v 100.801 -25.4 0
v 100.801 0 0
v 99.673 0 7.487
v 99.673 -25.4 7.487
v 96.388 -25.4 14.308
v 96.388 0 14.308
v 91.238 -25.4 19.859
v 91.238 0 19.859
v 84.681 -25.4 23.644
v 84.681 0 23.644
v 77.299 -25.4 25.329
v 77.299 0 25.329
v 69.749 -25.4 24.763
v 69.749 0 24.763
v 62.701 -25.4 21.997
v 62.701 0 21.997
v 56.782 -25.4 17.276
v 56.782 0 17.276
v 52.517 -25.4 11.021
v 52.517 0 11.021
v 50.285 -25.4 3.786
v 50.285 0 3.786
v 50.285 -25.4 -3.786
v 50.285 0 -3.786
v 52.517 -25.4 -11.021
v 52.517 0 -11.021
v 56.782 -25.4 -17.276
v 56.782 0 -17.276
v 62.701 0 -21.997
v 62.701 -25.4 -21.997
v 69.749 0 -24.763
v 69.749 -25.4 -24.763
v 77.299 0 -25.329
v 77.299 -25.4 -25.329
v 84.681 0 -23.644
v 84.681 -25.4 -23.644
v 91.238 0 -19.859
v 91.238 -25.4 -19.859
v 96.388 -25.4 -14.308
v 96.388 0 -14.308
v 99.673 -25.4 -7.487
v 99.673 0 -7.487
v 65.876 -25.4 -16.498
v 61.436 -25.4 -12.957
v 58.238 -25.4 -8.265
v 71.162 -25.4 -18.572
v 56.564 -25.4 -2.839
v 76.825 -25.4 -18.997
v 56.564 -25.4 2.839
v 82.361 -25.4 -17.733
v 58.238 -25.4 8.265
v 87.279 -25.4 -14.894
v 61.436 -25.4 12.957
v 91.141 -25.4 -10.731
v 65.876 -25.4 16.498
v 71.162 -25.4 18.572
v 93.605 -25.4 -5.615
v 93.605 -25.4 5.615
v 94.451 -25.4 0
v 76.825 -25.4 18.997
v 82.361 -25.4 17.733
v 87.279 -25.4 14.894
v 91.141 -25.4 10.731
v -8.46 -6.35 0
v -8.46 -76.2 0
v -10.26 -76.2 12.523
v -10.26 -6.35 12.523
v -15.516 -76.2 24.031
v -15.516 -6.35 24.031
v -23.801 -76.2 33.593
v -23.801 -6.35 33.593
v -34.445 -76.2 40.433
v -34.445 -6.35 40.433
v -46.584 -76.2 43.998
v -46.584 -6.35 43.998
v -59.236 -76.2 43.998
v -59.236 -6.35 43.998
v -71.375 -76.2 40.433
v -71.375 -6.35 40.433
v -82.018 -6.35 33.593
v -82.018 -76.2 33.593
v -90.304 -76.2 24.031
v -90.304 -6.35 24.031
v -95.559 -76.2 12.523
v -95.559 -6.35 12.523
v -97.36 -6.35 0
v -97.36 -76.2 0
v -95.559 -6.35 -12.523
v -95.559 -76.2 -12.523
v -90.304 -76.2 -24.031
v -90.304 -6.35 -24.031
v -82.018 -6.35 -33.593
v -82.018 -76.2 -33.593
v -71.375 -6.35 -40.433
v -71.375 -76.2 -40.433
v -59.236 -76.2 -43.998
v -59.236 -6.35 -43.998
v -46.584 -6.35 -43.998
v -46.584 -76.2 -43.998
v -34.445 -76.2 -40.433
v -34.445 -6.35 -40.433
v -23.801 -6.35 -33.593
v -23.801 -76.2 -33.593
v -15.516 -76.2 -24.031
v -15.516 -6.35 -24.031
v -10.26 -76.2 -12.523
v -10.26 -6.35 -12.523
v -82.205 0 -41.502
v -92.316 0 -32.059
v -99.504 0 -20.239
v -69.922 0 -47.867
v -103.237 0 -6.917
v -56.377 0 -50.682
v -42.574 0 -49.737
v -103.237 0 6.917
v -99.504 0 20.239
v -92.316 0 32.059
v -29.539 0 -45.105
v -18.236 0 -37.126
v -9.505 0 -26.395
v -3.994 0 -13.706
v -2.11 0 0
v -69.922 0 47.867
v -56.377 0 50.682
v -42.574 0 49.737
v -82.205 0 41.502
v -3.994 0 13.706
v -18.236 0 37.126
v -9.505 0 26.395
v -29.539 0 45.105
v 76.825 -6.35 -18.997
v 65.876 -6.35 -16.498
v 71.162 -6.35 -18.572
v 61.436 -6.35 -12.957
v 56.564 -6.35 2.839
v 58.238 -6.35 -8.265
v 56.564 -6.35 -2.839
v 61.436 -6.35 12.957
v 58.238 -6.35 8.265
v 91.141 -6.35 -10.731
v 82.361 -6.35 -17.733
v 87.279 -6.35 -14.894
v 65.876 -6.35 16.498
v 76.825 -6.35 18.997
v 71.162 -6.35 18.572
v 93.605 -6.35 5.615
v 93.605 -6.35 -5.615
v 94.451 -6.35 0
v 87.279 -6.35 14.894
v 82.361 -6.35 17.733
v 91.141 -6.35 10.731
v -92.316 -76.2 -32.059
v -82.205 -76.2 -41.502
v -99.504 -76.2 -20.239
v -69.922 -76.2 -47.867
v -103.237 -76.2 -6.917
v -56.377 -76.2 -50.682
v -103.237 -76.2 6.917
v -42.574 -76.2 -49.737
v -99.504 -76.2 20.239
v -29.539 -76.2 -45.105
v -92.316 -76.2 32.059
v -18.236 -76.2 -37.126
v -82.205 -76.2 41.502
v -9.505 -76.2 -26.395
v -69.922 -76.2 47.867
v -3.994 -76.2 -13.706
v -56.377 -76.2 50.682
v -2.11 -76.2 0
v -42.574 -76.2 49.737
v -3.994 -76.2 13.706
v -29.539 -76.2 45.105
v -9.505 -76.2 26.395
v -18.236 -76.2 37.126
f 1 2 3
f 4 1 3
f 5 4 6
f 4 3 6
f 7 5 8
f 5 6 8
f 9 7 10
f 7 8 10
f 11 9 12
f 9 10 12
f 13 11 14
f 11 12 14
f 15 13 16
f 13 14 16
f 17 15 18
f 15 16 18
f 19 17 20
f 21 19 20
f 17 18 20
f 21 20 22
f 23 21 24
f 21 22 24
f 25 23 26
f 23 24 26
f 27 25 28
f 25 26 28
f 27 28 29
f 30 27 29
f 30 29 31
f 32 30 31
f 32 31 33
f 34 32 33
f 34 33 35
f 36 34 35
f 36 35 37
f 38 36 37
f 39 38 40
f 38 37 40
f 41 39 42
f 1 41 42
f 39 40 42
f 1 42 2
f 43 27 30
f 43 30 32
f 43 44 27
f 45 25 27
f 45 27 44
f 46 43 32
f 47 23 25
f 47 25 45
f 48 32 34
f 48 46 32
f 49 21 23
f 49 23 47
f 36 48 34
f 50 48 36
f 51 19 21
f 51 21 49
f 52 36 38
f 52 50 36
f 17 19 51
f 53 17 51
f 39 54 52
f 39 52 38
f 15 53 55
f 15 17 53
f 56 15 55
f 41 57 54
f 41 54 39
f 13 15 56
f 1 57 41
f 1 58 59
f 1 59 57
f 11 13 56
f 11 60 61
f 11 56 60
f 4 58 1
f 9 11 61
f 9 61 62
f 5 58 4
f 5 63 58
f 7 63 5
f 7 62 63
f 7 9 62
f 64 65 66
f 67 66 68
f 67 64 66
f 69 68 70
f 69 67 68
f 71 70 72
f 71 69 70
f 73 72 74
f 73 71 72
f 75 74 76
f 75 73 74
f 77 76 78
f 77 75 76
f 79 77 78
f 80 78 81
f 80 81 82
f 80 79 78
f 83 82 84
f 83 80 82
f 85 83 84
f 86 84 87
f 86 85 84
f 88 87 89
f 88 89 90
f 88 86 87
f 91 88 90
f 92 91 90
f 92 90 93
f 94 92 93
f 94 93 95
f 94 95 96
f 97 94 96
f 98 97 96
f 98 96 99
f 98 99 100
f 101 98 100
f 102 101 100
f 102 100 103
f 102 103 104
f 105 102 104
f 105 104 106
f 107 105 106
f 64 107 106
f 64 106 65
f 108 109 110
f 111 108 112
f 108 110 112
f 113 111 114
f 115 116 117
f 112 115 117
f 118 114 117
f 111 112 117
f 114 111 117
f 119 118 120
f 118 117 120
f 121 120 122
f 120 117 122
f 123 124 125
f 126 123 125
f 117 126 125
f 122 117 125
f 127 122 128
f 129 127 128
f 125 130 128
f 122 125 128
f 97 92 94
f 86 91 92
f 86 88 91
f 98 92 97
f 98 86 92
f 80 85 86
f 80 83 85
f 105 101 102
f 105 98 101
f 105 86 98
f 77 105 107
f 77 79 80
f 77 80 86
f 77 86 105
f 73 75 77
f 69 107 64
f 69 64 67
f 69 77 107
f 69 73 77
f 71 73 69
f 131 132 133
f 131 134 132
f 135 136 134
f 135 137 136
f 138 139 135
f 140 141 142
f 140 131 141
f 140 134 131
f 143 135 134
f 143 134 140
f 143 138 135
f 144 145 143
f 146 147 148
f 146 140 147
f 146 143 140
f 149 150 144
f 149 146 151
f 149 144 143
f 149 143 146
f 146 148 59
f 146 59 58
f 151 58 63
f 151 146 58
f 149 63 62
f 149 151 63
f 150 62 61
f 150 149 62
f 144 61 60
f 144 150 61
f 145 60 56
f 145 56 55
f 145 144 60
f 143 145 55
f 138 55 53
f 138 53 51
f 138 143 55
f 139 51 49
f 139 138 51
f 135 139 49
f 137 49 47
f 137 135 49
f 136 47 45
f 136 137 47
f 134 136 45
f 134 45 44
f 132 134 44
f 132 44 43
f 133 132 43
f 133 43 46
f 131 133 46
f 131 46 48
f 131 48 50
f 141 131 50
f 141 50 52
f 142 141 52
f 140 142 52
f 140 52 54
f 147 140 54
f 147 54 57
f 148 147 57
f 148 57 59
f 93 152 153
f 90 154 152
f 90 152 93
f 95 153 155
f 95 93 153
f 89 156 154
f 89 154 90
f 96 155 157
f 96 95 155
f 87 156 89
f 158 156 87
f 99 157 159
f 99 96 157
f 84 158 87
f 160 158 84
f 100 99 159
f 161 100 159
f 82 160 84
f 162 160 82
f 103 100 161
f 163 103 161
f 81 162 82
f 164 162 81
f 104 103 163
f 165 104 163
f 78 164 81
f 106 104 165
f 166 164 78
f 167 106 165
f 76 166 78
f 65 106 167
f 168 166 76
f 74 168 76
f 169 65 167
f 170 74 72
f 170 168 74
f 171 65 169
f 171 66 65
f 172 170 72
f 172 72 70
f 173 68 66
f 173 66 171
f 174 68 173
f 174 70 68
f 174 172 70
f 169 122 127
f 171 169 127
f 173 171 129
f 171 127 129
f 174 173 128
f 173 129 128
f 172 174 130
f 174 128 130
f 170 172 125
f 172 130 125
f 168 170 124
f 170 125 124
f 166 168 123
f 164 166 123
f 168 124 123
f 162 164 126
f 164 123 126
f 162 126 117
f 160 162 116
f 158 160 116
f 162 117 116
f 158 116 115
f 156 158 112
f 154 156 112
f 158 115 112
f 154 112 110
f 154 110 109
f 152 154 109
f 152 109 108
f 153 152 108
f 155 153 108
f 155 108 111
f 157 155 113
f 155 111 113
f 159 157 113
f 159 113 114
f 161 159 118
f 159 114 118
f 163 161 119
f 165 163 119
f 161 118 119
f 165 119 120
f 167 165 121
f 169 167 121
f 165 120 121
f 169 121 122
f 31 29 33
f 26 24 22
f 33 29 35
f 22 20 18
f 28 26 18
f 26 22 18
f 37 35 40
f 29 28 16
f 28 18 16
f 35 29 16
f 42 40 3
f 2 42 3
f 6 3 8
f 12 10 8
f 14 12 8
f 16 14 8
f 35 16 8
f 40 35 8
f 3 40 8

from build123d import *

# Parameters (mm, degrees)
F0_R     = 25.4
F1_DEPTH = 25.4
F0_R_2   = 50.8
F2_DEPTH = 76.2
F3_T     = -6.35
F3_2_T   = -6.35


with BuildPart() as f1:
    # F0 (on Front) → F1 (new body)
    with BuildSketch(Plane.XZ):
        with Locations((75.401135, 0)):
            Circle(F0_R)
    extrude(amount=F1_DEPTH)

    # F3#2
    f3_2_openings = [f1.faces().sort_by_distance(p)[0] for p in [
        (75.401135, -25.4, 0),
    ]]
    offset(amount=F3_2_T, openings=f3_2_openings)


with BuildPart() as f2:
    # F0 (on Front) → F2 (new body)
    with BuildSketch(Plane.XZ):
        with Locations((-52.90984, 0)):
            Circle(F0_R_2)
    extrude(amount=F2_DEPTH)

    # F3
    f3_openings = [f2.faces().sort_by_distance(p)[0] for p in [
        (-52.90984, -76.2, 0),
    ]]
    offset(amount=F3_T, openings=f3_openings)


solid = Compound([f1.part, f2.part])
